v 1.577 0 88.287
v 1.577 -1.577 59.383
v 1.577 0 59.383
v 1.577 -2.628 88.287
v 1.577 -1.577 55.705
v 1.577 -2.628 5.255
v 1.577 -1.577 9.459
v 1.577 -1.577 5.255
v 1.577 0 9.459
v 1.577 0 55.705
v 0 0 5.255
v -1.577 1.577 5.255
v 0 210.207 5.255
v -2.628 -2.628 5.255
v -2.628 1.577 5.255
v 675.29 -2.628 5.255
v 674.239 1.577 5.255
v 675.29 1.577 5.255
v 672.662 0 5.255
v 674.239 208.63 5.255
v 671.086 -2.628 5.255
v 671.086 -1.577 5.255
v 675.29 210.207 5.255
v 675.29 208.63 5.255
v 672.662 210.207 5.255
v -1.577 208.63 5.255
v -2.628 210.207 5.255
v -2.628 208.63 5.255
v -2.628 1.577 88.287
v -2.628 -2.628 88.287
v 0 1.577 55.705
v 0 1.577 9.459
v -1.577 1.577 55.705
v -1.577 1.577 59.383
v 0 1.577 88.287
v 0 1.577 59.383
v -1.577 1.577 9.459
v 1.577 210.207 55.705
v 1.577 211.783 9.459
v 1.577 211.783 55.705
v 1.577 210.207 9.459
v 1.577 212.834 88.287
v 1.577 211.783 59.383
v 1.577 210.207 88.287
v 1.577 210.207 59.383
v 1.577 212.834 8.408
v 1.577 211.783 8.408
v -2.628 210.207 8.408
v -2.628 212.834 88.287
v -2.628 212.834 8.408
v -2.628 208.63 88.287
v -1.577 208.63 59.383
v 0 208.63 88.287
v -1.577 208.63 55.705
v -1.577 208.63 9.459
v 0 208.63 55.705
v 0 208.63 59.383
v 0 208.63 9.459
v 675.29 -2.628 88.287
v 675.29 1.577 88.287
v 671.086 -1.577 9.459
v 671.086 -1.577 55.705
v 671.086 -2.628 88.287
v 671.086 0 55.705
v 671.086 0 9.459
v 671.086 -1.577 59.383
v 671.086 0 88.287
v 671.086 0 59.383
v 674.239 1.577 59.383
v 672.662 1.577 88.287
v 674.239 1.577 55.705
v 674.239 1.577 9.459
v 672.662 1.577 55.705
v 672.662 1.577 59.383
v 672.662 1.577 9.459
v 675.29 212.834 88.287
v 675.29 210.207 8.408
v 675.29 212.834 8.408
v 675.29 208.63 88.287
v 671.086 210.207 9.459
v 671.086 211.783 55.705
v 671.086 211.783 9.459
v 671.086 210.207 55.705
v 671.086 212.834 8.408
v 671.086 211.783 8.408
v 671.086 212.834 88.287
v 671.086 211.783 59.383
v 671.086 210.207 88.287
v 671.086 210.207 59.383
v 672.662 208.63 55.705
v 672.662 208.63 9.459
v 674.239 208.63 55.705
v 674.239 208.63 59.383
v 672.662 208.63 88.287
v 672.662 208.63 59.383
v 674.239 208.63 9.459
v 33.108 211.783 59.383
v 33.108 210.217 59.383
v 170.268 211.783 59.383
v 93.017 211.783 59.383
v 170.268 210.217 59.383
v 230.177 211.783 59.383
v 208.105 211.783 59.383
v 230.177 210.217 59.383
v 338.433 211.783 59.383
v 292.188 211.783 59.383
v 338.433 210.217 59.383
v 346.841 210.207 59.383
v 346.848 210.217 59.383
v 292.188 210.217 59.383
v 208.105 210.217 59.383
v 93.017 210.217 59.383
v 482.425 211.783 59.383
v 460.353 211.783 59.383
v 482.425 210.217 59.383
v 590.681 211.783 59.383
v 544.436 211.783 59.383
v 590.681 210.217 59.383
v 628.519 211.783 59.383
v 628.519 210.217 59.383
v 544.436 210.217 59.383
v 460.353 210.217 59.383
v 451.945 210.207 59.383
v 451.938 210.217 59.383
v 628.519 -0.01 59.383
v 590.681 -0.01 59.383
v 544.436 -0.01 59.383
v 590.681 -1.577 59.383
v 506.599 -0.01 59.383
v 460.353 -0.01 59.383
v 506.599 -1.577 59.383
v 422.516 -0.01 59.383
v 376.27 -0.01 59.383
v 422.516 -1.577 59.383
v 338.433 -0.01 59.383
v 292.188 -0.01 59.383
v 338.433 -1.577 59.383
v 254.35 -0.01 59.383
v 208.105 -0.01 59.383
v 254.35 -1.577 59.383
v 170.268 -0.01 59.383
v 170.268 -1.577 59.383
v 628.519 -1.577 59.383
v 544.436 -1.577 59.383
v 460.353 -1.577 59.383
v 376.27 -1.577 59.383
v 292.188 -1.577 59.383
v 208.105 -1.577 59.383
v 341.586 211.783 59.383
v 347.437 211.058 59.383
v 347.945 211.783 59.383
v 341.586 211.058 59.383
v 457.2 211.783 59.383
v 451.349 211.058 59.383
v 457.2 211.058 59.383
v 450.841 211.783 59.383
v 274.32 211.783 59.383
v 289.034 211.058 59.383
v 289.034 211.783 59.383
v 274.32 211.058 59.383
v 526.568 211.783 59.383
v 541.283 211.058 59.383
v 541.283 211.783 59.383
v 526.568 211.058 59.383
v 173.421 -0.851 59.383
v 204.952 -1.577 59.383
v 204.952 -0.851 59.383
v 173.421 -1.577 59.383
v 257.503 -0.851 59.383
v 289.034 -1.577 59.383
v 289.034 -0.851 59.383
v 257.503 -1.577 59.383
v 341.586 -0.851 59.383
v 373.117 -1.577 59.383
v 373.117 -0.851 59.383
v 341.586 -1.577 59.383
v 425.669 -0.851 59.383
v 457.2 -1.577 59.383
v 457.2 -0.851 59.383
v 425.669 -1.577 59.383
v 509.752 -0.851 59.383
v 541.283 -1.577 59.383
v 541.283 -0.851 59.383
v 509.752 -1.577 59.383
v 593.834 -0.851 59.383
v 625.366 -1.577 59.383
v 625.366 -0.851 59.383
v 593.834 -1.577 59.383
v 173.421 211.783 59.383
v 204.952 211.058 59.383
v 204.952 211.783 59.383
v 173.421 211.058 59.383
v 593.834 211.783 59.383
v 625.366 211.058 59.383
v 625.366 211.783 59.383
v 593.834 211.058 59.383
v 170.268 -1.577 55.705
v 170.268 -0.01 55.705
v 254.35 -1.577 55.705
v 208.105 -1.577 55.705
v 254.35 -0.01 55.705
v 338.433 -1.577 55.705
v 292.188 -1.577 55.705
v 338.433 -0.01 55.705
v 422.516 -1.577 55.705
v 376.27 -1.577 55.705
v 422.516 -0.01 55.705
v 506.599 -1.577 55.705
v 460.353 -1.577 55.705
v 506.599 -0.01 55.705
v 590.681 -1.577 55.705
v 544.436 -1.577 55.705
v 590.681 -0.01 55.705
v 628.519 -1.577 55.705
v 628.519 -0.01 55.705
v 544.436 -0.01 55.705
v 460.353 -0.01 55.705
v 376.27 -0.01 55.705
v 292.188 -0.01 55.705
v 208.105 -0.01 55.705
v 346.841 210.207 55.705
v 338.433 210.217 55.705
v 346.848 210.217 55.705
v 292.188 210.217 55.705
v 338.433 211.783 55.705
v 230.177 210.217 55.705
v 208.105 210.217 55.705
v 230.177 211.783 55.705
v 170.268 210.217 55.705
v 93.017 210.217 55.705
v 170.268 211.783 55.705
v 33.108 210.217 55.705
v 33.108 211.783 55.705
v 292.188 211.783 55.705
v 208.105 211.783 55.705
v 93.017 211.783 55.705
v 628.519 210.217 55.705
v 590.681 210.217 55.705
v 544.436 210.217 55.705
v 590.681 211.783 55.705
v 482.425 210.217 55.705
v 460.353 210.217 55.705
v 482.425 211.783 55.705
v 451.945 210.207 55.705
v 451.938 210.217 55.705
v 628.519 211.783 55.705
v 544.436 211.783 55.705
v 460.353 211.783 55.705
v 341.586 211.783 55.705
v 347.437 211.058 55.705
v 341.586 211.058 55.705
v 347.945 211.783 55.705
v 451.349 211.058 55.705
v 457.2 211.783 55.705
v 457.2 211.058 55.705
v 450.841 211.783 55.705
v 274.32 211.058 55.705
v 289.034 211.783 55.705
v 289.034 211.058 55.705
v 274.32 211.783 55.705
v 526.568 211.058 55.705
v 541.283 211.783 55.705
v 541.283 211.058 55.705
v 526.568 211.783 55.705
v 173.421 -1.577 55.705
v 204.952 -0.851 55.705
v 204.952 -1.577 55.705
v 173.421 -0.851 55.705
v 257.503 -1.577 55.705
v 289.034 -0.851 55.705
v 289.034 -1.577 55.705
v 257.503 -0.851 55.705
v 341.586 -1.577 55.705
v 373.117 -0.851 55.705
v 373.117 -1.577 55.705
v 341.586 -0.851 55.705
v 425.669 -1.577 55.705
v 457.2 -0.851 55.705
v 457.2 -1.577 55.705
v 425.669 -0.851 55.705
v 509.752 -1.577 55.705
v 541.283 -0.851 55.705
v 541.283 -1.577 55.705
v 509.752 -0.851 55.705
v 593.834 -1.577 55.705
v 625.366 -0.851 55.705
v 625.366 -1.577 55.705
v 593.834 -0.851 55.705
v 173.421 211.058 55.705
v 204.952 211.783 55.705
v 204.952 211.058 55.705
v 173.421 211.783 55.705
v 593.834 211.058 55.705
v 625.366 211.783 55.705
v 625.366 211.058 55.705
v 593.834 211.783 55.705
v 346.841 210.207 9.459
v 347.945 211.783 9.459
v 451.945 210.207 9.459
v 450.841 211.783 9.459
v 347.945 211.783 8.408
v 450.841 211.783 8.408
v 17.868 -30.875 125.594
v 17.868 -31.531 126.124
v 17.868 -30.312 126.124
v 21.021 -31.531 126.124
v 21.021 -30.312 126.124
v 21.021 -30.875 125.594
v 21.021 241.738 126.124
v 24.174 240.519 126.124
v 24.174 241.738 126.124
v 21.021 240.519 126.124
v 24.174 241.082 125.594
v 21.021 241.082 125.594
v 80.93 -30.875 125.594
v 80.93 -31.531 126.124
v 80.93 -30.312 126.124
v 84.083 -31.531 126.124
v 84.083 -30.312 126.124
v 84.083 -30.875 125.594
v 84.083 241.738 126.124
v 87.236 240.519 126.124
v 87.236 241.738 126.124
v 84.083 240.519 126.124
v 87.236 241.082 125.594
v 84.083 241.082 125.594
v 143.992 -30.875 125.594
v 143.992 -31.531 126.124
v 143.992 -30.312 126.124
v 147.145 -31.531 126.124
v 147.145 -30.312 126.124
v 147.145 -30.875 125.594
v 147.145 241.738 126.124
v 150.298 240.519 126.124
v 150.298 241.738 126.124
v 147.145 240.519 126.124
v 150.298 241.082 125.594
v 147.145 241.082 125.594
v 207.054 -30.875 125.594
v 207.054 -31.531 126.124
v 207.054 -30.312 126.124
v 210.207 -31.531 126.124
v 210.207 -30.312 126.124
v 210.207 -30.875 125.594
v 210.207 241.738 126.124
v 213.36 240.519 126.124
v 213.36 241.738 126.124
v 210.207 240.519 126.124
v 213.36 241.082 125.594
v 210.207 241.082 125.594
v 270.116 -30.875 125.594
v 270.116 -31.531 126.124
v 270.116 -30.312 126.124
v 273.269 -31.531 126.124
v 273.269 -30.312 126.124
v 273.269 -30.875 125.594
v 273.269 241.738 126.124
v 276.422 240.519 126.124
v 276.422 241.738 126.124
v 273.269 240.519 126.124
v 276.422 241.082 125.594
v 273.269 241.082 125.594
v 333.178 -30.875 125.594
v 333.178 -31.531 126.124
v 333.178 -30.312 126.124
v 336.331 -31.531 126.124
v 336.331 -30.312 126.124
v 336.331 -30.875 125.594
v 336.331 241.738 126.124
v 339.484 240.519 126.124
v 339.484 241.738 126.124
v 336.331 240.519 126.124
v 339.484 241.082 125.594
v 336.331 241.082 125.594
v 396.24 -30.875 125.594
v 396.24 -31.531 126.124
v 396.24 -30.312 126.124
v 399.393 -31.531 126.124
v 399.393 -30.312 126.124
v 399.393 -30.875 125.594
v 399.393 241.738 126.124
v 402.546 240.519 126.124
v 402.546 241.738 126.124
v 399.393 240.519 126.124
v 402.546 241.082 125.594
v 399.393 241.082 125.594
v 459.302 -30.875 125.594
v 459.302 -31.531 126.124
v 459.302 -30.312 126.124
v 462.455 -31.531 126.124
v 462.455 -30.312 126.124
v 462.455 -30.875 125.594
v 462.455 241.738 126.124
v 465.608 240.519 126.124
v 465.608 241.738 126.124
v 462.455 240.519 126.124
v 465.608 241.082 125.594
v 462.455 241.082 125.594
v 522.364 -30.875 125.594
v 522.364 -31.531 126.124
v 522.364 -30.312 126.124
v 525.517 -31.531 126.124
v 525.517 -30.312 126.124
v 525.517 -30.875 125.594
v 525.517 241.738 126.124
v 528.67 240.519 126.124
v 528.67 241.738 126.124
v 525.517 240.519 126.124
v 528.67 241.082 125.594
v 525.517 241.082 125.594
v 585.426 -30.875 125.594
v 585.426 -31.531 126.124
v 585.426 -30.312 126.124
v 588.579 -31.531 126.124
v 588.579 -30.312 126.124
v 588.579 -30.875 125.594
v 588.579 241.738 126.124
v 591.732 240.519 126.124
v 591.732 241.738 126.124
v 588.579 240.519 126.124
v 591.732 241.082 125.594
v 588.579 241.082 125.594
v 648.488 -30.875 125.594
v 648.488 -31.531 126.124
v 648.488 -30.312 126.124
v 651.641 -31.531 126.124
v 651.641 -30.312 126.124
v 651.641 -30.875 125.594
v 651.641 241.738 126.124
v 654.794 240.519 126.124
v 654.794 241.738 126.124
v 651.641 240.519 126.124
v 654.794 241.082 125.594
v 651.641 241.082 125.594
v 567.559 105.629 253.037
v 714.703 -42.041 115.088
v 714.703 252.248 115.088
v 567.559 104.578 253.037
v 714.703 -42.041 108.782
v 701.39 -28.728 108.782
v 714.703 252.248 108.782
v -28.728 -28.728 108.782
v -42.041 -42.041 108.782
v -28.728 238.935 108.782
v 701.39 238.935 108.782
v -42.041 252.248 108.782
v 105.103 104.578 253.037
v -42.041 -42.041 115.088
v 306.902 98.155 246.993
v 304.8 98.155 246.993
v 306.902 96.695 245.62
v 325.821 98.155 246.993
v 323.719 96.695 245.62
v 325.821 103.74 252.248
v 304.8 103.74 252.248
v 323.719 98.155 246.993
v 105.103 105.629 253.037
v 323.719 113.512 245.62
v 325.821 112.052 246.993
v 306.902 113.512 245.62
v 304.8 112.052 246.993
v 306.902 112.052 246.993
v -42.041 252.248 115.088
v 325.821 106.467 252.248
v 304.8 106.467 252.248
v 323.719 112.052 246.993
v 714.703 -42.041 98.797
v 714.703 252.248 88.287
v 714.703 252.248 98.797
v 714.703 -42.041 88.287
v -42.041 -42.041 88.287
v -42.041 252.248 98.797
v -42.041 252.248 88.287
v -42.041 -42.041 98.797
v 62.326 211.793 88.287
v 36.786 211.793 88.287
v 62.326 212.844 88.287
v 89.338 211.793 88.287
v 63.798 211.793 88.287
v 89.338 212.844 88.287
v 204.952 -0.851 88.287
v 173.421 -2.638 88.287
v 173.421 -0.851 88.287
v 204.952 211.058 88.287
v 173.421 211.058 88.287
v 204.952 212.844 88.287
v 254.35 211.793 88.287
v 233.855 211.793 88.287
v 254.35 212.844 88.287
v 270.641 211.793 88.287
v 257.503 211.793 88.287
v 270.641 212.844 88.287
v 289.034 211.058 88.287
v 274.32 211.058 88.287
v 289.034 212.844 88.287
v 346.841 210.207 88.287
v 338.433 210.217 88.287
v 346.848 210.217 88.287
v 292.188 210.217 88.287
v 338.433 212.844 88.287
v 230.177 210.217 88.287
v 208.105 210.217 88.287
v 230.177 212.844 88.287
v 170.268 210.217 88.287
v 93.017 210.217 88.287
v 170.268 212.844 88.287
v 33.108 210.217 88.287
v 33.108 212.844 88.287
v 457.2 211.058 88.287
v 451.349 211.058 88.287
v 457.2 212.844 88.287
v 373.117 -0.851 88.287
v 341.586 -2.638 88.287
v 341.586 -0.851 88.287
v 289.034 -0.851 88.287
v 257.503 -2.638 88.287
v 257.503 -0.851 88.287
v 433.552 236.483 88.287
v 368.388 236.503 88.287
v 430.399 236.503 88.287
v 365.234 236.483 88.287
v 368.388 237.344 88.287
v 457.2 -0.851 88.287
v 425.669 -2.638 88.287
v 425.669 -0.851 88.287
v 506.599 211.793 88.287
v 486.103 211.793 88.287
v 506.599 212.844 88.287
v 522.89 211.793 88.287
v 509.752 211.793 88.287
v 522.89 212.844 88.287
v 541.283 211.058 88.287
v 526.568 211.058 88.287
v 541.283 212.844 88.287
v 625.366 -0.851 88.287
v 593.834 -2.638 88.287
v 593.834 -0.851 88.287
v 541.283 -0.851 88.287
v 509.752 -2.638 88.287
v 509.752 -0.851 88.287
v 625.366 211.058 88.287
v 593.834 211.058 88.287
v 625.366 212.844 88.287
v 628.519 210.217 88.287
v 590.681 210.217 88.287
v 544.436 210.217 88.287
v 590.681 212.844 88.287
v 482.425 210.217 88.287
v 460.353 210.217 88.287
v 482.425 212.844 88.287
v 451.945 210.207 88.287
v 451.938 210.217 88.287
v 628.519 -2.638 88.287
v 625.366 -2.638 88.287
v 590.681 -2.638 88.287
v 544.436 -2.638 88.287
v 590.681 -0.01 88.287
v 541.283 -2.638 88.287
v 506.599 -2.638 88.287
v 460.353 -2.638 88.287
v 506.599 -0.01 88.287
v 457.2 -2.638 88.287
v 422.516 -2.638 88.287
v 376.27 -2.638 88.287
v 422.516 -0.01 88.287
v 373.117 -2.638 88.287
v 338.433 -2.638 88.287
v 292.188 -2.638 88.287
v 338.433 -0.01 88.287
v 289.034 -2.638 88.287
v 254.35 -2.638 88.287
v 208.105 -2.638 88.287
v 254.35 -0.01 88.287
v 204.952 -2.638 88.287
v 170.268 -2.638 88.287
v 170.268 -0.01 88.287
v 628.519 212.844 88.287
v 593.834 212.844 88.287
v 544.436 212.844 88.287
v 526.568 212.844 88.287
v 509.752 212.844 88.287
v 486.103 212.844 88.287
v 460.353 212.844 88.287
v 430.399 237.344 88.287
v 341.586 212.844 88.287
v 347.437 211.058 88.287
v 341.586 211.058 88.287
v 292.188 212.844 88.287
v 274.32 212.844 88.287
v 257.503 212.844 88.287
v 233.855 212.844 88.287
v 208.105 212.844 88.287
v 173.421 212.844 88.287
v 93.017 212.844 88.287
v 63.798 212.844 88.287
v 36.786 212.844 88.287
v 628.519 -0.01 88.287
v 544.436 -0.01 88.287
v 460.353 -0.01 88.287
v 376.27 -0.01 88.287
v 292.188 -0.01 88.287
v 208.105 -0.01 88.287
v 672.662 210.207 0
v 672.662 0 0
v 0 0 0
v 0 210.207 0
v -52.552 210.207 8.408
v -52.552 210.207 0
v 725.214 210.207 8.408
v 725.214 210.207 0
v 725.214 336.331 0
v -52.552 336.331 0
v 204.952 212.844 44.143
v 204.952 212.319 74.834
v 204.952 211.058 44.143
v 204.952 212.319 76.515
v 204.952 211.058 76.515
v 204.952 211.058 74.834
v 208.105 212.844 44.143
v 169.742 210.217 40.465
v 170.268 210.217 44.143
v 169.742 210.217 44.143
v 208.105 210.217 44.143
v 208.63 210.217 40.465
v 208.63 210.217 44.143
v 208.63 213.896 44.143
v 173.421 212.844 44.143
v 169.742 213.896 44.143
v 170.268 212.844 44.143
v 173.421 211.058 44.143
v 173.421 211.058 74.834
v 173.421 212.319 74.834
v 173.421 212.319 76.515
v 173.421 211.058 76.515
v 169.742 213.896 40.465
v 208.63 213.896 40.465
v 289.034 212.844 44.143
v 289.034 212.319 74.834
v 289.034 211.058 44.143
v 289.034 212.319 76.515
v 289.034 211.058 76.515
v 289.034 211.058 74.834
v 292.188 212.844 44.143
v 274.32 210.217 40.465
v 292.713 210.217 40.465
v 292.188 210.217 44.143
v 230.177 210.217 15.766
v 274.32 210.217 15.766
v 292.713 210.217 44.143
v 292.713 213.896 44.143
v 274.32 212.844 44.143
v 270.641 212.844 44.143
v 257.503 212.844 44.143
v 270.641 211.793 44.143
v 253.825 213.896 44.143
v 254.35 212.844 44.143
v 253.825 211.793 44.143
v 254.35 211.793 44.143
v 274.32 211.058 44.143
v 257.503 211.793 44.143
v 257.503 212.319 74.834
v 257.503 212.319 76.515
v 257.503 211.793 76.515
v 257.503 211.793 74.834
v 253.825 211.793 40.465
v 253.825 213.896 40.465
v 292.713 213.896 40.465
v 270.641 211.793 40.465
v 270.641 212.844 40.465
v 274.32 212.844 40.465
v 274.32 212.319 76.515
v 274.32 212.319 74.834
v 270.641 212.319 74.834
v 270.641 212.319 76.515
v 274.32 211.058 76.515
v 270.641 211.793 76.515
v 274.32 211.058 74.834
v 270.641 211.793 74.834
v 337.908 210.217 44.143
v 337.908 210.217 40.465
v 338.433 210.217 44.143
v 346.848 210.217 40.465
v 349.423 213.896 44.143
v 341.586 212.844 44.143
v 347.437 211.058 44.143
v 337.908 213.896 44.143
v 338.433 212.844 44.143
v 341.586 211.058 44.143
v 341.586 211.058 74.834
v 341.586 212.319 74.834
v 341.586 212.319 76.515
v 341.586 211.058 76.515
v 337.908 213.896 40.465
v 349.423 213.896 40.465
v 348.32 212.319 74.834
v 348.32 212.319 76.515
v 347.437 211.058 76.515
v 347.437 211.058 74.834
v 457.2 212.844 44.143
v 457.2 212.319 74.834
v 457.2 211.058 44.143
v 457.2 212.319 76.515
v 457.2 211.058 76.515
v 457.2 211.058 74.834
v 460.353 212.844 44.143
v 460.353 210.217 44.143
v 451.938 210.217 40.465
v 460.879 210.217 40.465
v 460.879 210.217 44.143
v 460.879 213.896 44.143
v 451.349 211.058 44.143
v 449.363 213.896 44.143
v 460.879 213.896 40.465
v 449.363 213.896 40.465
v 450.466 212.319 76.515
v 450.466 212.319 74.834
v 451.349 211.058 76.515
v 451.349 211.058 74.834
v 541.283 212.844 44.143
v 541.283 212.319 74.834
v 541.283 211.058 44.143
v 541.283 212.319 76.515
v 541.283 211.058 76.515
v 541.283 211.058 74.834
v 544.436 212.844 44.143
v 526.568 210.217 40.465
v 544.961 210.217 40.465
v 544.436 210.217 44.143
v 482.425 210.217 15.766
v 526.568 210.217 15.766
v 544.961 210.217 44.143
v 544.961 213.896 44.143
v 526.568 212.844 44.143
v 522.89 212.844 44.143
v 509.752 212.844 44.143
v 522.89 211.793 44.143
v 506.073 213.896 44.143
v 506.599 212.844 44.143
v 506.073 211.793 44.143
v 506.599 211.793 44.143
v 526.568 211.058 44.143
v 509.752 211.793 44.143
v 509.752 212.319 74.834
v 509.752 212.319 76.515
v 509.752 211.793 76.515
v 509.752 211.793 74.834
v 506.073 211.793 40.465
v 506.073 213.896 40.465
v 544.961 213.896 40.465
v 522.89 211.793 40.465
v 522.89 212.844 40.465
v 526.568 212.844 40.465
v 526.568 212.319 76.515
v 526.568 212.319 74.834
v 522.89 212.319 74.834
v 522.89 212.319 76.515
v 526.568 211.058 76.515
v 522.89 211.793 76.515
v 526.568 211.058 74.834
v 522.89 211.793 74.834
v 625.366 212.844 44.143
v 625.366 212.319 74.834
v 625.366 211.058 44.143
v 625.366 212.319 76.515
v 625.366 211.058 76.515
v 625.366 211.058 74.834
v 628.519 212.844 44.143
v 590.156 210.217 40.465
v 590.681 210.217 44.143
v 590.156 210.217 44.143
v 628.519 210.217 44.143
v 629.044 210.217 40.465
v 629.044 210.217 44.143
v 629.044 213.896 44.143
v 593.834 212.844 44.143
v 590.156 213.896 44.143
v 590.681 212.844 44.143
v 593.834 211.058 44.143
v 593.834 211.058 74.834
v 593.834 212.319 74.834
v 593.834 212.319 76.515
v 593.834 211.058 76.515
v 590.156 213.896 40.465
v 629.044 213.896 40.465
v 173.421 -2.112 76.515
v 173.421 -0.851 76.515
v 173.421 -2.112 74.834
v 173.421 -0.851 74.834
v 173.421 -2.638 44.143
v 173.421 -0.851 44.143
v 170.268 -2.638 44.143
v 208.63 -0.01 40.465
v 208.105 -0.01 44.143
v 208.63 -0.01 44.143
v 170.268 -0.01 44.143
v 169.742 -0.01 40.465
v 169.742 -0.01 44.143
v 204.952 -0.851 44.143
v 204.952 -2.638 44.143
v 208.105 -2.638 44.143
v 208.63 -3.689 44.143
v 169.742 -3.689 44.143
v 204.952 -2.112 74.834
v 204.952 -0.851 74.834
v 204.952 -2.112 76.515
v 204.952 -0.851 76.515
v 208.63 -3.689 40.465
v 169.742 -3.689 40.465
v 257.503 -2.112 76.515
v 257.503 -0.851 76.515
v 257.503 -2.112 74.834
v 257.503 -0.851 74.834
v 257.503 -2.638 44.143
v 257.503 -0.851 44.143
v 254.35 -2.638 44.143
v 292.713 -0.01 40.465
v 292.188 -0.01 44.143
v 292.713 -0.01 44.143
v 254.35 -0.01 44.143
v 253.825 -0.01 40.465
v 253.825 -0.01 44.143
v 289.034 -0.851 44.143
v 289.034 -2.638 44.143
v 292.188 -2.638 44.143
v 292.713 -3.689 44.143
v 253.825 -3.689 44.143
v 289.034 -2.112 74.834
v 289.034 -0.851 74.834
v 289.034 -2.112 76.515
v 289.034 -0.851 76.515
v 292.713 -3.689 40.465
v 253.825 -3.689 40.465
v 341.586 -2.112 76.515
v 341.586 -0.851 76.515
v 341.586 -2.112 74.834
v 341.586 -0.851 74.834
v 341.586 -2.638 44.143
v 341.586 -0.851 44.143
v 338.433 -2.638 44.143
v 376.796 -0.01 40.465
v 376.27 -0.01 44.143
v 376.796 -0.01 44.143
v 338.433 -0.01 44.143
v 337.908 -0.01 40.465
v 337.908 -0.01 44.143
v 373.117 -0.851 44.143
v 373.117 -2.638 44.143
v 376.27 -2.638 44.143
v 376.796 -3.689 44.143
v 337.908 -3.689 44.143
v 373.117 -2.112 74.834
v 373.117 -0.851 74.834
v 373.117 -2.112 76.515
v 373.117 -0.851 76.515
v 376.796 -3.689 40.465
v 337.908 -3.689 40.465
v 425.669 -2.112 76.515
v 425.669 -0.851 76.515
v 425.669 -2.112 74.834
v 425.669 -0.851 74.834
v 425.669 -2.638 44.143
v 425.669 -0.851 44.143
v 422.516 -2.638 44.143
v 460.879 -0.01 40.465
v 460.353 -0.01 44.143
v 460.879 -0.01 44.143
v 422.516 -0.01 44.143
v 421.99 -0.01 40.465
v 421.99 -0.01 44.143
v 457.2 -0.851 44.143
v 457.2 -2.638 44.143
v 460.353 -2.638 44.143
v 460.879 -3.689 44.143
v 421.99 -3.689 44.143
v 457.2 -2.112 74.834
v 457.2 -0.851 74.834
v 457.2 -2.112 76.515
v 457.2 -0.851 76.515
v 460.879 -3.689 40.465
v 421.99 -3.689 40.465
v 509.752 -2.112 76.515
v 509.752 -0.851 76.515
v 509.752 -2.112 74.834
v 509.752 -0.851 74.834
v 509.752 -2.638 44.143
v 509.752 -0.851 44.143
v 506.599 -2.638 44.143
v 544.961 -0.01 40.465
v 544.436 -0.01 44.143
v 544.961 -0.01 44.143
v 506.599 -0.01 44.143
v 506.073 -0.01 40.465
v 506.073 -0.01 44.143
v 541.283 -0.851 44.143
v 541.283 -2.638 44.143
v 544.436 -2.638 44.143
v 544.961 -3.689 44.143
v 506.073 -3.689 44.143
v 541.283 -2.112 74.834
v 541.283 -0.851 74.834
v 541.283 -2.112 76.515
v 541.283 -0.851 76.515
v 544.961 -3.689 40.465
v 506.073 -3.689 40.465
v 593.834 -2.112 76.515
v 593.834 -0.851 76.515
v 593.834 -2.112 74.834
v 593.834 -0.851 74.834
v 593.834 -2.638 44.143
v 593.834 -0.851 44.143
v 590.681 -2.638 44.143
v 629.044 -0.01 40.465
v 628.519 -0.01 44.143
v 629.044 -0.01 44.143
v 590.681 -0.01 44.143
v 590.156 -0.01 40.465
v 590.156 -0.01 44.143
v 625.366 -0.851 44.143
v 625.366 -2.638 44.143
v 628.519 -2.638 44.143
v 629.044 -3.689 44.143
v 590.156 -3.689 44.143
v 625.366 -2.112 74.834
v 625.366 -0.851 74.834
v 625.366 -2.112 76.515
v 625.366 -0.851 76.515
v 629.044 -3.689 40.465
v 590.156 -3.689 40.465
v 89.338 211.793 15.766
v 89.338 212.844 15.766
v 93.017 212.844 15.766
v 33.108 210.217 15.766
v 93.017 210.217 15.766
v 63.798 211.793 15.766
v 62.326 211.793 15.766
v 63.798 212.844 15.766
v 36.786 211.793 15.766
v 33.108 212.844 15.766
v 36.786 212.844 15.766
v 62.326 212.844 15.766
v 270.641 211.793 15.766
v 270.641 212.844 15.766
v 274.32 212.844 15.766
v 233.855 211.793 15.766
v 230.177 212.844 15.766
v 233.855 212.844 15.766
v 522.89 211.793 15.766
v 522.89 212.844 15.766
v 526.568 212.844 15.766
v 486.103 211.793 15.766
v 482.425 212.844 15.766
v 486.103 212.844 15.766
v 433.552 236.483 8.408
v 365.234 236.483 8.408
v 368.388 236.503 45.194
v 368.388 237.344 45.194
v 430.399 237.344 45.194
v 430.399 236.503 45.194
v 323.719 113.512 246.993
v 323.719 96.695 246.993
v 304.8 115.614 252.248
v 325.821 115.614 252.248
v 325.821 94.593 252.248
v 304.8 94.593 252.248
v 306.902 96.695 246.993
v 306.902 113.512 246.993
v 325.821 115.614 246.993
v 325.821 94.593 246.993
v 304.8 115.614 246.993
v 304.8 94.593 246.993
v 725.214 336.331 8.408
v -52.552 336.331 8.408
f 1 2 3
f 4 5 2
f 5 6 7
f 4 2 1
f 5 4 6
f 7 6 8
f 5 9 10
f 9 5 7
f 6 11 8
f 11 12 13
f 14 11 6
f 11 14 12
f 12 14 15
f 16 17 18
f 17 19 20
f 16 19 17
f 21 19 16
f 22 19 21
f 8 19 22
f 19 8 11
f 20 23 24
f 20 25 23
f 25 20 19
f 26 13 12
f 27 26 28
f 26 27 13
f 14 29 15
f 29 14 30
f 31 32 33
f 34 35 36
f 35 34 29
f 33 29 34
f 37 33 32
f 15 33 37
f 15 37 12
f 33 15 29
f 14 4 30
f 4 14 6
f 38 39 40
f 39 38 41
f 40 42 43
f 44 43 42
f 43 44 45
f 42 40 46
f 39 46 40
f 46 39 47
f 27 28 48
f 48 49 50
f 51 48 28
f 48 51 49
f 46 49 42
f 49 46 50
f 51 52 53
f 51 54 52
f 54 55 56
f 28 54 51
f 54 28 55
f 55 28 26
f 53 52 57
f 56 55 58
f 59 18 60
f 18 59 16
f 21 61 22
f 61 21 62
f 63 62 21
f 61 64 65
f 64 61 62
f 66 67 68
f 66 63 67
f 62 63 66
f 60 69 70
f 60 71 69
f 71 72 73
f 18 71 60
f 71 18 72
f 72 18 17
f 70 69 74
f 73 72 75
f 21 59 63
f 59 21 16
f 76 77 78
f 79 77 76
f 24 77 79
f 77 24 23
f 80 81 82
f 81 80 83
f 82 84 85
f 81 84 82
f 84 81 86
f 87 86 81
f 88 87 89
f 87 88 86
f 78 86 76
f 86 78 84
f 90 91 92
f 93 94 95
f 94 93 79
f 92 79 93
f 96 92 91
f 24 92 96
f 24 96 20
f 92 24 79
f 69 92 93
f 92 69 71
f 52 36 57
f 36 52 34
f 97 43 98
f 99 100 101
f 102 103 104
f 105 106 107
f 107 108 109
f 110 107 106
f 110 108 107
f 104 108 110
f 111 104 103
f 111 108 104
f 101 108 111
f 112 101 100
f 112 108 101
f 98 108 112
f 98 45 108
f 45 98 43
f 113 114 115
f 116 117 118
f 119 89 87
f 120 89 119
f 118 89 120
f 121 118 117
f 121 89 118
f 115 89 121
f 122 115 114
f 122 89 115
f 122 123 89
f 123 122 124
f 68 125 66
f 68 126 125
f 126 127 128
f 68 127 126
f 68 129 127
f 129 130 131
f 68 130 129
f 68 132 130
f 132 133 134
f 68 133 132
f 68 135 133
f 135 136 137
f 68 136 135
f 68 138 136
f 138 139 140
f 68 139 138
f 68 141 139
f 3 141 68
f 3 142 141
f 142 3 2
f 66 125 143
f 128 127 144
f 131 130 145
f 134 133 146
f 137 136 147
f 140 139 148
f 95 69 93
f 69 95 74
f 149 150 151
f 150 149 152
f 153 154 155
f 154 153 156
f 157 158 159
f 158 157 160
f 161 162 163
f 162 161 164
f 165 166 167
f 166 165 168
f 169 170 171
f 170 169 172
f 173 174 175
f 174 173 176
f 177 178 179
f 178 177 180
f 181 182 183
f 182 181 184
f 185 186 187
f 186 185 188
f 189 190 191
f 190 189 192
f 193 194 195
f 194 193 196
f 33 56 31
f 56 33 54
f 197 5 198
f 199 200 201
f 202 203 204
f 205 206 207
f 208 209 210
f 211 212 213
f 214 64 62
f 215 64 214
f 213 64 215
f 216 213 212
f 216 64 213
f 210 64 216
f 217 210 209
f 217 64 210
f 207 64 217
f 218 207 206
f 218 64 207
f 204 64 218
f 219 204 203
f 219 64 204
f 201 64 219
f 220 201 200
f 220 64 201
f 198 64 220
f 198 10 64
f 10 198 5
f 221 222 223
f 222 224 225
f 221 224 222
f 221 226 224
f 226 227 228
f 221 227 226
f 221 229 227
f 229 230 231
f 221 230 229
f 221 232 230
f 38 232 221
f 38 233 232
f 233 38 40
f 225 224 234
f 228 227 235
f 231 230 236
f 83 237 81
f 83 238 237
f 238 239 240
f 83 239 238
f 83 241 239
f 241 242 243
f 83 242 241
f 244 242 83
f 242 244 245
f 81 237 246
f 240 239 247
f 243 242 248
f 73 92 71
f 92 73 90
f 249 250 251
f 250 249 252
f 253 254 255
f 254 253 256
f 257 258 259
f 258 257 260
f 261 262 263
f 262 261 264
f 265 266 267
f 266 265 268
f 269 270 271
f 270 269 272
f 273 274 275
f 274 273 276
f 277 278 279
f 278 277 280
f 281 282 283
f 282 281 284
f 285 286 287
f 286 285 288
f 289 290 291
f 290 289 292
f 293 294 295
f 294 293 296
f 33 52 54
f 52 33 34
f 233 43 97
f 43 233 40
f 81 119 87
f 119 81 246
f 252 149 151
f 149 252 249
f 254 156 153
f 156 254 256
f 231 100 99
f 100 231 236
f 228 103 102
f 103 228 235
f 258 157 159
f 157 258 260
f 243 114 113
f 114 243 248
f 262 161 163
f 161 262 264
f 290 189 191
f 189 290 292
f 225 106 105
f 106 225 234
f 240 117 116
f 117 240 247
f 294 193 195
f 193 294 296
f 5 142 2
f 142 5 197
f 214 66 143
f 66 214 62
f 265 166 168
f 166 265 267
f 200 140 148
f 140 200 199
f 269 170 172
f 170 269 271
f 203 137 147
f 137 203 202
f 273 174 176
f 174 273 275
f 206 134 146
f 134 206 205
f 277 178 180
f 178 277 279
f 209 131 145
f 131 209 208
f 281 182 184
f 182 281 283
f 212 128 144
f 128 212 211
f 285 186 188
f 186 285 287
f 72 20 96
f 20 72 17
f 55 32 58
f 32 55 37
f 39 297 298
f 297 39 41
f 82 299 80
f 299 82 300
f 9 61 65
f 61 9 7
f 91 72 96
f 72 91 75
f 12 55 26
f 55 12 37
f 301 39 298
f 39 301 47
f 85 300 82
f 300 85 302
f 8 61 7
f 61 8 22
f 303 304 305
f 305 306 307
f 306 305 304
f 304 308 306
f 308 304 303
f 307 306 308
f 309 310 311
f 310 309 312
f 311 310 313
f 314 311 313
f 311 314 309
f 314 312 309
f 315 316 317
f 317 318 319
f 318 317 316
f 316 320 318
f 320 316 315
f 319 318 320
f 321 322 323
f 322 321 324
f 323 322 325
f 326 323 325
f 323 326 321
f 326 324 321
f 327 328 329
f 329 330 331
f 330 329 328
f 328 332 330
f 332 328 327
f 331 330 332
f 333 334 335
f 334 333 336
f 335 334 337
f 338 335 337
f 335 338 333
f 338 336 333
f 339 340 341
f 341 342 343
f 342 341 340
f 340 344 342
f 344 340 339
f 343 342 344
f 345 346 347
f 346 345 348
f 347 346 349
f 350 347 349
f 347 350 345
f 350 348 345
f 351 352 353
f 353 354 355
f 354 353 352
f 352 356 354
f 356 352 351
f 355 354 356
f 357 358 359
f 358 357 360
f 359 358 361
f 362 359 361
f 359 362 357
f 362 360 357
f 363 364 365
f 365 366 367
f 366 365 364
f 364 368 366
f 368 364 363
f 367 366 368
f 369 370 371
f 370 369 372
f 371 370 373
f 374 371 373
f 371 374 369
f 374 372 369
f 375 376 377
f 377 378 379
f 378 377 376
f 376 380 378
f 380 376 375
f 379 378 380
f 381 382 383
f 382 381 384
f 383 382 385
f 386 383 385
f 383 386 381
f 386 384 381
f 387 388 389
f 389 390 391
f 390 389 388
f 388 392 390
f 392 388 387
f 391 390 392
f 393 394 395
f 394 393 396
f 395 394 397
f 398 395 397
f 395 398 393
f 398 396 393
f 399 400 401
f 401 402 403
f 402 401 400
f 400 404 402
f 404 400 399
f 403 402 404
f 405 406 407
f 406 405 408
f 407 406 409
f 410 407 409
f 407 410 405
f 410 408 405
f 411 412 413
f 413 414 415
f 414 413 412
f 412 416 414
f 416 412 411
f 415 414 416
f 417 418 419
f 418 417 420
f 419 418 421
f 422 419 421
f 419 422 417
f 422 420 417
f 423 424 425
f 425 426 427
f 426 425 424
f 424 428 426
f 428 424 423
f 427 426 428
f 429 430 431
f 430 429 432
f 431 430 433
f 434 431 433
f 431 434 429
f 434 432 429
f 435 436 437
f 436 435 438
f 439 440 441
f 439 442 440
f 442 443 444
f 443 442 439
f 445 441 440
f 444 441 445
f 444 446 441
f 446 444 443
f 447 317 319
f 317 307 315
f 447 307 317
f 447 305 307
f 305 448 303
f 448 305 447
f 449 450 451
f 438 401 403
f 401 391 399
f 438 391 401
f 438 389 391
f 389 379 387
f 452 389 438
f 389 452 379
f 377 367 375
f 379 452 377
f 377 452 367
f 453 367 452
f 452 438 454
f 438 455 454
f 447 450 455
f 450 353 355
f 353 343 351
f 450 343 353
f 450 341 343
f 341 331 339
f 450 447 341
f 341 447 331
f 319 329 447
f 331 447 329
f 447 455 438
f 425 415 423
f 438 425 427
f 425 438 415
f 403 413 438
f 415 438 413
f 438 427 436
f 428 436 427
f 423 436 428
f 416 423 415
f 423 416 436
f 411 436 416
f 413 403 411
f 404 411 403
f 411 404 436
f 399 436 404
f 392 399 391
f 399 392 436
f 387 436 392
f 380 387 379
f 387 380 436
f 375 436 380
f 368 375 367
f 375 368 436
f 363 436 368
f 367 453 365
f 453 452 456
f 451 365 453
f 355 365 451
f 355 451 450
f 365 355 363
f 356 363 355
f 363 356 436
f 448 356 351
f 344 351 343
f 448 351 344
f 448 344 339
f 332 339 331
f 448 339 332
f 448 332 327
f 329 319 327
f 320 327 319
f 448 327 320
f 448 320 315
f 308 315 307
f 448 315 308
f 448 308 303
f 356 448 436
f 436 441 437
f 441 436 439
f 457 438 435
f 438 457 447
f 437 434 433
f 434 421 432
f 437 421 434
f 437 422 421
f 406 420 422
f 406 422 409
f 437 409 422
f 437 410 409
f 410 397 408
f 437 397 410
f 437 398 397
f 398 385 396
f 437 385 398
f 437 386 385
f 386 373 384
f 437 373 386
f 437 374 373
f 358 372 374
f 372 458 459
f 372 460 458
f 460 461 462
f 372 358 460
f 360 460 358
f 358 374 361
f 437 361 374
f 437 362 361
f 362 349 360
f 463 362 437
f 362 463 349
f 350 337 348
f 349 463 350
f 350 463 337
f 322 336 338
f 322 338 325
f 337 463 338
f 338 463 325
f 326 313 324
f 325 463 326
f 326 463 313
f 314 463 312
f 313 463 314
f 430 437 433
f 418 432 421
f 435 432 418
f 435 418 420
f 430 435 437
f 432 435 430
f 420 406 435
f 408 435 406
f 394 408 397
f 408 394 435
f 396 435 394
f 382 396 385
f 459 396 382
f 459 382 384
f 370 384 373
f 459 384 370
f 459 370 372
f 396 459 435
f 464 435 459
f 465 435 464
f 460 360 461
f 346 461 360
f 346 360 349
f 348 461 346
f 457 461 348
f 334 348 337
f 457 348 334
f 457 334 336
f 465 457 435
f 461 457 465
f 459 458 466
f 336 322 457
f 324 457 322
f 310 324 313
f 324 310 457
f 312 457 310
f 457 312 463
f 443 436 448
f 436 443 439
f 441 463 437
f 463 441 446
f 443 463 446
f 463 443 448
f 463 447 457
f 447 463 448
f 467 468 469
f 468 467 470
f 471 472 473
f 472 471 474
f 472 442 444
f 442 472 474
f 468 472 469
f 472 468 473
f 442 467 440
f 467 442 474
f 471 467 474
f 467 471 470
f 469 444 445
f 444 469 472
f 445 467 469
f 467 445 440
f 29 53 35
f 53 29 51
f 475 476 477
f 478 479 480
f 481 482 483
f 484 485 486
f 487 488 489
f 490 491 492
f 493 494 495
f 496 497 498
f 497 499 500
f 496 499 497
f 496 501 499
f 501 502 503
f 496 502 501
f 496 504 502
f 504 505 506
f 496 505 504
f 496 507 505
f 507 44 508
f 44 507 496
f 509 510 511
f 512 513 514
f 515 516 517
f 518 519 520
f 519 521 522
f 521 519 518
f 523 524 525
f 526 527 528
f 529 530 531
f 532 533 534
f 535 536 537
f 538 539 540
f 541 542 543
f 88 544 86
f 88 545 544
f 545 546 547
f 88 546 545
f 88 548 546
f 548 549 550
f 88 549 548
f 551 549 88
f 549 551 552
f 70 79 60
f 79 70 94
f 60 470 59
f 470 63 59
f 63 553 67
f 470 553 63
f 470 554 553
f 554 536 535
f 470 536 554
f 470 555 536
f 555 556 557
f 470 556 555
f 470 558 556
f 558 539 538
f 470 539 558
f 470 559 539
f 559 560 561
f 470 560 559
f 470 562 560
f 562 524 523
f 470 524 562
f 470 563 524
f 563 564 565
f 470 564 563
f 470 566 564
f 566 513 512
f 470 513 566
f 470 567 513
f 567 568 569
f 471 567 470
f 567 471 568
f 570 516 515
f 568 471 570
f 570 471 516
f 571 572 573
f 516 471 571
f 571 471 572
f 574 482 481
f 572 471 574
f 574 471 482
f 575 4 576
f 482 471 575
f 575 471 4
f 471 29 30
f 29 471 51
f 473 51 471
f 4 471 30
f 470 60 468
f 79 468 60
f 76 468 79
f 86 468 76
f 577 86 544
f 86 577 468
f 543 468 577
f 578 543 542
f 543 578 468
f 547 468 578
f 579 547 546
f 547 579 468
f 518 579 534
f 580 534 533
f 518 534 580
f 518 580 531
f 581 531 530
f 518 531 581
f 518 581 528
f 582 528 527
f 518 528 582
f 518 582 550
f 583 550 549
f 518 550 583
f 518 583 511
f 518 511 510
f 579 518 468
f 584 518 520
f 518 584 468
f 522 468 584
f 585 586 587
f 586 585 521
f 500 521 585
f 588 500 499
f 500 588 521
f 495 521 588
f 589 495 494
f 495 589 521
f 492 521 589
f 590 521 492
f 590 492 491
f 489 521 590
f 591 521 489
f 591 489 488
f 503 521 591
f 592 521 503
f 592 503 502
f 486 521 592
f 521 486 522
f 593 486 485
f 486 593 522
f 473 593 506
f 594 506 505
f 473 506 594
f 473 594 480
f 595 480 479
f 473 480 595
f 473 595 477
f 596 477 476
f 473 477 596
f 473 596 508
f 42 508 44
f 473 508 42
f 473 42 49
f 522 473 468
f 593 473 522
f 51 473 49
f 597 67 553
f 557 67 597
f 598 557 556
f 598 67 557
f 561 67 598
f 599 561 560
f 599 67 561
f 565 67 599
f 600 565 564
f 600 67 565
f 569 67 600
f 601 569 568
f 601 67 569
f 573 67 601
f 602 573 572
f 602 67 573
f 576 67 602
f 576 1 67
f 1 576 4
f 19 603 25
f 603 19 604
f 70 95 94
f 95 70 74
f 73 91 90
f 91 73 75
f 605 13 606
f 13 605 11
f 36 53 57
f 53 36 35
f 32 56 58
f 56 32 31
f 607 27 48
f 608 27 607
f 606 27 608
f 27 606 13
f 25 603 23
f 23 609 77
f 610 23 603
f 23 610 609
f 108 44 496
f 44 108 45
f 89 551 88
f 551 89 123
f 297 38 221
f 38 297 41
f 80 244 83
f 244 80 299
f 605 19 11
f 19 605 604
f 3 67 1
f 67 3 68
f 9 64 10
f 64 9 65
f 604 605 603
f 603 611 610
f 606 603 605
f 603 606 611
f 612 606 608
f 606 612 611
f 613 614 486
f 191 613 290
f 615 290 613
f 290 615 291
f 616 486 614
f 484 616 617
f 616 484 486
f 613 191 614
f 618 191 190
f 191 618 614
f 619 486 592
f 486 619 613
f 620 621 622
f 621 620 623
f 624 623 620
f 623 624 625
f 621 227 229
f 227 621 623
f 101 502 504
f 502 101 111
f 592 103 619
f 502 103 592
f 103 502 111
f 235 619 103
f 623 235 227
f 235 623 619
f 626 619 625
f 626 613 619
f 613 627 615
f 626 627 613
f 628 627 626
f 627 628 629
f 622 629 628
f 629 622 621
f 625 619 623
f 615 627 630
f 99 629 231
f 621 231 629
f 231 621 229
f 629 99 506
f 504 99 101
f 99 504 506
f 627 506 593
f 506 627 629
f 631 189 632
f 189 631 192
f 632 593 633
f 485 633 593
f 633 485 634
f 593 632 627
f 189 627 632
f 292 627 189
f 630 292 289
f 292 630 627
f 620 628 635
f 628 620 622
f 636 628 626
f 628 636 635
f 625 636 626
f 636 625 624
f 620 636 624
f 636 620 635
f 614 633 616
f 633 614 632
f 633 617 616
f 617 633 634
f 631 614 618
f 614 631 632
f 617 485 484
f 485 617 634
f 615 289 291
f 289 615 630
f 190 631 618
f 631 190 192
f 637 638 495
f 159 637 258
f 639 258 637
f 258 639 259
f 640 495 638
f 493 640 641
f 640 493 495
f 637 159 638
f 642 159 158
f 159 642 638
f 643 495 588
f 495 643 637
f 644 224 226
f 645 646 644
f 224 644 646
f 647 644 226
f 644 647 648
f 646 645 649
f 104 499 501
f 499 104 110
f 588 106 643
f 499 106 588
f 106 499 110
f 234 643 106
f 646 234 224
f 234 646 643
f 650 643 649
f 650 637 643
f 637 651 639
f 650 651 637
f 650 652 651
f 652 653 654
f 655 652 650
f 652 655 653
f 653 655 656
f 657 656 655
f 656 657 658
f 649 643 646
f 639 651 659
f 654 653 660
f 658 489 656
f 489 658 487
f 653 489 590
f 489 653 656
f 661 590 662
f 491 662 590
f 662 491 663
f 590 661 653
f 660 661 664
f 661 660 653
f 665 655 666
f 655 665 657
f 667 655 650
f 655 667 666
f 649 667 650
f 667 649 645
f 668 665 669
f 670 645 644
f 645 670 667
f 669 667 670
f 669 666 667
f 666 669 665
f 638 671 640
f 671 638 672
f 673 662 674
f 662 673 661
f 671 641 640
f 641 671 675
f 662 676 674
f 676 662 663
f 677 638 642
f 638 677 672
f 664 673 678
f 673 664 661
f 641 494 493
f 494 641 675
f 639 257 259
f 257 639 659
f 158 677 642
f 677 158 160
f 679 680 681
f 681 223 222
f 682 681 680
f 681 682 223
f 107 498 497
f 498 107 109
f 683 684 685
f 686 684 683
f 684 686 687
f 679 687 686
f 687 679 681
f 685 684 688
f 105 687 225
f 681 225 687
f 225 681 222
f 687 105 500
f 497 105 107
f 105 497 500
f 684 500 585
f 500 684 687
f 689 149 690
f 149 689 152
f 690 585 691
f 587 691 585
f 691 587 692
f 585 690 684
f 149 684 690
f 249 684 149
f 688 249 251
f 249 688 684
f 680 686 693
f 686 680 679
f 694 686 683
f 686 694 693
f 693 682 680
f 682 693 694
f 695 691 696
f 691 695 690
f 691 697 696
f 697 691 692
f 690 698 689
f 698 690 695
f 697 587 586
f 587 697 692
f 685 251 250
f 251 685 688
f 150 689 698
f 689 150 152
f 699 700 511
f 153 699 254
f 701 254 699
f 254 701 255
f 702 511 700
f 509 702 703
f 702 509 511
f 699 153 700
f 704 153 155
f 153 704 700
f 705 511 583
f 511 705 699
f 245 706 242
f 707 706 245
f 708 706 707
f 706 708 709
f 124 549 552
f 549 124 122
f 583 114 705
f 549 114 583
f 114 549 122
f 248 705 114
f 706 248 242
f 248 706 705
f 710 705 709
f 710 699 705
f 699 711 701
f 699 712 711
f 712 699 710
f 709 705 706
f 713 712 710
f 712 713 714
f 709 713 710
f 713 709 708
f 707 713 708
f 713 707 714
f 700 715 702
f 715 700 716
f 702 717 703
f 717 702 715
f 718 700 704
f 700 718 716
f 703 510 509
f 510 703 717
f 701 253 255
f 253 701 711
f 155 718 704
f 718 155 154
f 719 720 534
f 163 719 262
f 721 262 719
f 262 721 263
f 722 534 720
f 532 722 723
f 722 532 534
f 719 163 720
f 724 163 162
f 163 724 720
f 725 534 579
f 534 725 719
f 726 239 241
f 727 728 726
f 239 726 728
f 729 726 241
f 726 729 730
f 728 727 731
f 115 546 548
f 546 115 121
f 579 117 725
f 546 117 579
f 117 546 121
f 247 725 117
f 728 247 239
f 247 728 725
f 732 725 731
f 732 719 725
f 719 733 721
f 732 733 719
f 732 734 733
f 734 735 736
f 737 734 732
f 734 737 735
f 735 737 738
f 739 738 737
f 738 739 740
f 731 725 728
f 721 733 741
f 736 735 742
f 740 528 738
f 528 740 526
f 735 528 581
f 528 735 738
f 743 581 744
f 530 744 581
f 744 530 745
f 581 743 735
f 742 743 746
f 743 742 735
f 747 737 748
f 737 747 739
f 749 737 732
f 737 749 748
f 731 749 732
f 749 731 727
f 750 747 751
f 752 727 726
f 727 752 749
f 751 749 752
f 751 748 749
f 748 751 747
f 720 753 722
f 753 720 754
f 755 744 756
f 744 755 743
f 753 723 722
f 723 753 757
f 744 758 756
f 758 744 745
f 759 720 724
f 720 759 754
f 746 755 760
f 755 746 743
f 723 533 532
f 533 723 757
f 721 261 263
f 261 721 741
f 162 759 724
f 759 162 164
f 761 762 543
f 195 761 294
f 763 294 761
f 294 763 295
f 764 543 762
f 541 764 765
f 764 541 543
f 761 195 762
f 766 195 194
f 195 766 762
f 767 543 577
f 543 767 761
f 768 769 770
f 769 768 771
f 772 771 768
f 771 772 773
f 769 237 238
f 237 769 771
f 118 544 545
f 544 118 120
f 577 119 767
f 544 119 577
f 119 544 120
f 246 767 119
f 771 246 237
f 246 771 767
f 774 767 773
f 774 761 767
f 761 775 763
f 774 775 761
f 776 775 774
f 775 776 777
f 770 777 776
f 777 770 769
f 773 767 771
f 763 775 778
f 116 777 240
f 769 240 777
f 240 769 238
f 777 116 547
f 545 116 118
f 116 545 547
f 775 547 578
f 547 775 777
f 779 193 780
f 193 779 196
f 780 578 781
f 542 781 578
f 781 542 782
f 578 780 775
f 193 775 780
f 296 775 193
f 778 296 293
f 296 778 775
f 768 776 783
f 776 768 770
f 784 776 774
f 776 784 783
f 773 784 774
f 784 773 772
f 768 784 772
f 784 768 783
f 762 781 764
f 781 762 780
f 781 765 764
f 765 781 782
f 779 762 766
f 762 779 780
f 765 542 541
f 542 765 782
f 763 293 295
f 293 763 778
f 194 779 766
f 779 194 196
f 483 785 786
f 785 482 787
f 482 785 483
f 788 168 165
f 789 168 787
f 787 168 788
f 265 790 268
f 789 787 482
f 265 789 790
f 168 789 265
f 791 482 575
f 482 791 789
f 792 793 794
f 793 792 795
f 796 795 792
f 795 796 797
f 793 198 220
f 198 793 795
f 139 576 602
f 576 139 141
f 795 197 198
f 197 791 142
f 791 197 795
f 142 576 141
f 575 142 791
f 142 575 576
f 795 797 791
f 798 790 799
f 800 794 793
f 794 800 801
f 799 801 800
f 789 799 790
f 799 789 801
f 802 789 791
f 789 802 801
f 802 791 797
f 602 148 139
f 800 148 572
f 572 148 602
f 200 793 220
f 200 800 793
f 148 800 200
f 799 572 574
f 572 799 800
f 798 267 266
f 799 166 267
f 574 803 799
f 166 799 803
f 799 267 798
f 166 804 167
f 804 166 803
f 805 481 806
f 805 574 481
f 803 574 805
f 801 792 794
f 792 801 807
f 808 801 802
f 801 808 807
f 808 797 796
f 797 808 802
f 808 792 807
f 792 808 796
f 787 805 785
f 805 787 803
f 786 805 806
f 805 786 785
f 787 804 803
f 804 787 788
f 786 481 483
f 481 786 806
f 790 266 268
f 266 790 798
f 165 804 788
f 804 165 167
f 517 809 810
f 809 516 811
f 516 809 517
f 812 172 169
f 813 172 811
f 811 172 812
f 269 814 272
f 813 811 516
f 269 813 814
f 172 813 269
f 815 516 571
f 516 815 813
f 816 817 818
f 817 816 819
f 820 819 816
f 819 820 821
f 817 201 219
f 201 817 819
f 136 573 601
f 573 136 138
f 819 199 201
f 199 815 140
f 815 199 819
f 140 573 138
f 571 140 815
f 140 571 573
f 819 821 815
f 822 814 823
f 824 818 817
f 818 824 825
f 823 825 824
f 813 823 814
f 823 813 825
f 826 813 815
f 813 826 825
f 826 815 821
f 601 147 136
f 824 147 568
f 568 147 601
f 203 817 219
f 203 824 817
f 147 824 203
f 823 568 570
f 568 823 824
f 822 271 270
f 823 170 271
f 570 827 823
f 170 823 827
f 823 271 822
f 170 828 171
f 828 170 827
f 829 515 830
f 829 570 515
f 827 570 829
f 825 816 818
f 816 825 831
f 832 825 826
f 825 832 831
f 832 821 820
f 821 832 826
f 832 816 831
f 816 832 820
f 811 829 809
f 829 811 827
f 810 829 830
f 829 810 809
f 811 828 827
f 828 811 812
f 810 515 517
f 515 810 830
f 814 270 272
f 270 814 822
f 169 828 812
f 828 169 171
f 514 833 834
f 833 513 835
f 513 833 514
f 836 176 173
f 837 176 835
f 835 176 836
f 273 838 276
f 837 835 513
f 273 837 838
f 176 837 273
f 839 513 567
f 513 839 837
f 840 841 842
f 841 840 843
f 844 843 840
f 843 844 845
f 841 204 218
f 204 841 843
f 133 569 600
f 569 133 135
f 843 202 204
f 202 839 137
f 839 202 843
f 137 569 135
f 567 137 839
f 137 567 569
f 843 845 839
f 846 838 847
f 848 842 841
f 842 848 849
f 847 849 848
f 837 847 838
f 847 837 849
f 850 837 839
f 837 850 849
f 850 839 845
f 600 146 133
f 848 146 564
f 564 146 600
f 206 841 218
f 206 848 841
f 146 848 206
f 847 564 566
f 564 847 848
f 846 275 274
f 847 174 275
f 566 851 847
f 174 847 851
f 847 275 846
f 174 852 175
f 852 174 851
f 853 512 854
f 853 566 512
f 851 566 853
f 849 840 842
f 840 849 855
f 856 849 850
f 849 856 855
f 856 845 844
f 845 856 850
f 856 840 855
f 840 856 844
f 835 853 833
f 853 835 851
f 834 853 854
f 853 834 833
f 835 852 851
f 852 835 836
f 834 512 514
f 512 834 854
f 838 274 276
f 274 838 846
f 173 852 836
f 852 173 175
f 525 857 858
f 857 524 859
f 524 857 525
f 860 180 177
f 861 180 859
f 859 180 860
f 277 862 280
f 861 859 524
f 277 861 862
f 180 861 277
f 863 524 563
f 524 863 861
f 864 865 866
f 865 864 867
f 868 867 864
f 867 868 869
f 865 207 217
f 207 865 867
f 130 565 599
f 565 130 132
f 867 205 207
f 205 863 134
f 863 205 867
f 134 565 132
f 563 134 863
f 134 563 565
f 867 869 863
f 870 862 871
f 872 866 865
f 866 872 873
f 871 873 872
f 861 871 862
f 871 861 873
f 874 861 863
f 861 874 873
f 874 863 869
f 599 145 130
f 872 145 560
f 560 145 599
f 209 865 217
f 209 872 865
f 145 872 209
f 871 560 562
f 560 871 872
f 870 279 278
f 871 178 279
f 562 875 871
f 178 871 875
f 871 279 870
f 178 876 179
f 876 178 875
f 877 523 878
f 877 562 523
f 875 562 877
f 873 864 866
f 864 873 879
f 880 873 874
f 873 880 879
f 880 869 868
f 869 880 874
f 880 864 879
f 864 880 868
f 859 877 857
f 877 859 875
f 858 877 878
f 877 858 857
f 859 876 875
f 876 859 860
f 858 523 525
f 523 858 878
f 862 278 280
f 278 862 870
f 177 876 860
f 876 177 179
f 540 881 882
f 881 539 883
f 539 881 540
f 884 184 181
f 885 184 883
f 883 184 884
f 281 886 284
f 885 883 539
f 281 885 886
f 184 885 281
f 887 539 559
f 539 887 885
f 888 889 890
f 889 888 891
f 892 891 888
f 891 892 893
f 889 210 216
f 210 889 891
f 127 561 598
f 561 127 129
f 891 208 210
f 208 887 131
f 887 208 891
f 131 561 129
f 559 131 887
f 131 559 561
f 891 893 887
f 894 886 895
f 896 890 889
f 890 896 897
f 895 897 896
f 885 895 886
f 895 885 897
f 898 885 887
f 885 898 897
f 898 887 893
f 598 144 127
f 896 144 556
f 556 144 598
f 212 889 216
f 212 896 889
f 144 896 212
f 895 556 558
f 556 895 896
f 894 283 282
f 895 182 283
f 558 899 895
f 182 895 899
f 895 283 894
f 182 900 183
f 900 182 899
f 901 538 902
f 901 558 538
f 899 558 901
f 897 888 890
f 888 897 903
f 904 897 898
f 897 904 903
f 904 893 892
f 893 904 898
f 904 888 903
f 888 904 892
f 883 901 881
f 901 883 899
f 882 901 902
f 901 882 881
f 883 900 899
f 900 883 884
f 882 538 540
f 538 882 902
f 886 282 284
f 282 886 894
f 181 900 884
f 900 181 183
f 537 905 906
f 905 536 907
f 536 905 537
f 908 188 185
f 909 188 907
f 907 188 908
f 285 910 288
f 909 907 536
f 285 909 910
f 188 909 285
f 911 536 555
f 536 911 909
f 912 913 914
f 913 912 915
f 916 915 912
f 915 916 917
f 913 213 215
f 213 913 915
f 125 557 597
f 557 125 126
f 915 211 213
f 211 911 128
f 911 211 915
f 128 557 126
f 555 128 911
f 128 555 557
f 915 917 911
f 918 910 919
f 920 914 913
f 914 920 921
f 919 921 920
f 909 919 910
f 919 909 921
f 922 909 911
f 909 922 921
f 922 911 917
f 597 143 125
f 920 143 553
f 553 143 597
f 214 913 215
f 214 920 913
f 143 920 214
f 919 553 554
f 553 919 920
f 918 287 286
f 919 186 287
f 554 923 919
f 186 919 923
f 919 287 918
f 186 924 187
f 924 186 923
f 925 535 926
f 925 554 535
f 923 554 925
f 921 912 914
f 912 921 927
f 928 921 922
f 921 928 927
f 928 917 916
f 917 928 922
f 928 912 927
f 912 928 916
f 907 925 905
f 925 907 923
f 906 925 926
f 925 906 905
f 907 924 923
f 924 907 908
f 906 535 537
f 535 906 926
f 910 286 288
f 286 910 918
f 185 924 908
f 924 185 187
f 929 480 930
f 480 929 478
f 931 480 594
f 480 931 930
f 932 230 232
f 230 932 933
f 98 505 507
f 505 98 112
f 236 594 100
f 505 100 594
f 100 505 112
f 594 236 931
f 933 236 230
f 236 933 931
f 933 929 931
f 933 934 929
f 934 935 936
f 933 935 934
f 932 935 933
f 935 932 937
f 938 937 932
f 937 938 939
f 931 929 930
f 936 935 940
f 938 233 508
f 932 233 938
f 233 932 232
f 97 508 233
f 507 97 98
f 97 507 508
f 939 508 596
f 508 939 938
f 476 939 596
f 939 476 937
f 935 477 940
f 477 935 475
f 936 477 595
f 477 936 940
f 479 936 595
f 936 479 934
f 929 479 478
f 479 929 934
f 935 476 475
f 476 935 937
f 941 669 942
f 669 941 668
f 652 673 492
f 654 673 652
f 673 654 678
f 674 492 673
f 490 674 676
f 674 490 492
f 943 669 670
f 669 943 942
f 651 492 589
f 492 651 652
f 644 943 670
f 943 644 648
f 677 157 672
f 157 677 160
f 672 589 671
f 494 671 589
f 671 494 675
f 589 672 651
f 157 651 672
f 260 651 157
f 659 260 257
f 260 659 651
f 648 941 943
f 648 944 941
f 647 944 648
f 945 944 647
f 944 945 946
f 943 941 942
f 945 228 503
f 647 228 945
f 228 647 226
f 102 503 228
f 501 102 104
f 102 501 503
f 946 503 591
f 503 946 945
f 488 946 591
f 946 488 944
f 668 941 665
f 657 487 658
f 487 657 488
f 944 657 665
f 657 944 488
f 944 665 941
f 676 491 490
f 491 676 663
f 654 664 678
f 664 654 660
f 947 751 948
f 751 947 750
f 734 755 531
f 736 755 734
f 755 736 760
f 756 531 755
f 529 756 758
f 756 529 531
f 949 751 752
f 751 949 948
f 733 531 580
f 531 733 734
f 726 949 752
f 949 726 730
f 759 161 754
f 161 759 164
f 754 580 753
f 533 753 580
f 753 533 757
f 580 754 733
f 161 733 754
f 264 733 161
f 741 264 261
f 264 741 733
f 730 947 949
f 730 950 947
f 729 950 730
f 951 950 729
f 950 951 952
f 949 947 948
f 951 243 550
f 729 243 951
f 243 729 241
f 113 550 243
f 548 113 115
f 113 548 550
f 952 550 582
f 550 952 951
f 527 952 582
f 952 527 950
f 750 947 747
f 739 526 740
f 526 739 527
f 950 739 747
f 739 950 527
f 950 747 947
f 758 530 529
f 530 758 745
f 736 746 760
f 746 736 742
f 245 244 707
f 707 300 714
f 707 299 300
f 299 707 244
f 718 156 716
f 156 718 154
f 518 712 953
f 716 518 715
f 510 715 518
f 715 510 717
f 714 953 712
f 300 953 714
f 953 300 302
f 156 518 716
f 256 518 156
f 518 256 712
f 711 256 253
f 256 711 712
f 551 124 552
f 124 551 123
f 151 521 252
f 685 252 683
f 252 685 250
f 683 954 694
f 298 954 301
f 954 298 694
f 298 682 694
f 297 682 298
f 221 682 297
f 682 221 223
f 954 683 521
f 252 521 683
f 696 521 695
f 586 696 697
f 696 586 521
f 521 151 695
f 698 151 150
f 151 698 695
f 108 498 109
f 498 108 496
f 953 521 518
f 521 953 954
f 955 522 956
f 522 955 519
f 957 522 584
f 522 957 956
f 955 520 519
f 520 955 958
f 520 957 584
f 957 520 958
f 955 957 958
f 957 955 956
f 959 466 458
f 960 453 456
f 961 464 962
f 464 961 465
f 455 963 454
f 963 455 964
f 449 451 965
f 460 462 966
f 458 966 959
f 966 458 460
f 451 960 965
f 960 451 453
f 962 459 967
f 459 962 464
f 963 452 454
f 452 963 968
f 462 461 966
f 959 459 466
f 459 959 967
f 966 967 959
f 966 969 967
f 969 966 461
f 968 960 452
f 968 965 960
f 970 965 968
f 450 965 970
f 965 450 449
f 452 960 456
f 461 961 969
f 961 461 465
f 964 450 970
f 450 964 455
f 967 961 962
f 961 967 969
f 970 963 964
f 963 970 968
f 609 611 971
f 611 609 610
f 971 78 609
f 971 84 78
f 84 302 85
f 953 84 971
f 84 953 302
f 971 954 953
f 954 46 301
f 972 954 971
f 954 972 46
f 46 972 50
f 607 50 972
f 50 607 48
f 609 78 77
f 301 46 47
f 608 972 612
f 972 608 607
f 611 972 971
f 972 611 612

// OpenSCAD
// =====================================================================
//  MILWAUKEE ROAD - RICHLAND CENTER, WIS. PASSENGER DEPOT
//  Source: Album sheet 67, drawing B-616, Nov 3 1909.  Drawings are private reference (in copyright):
//  Research Library / RSW / Stations / Standard depots / Album of Depot Plans 1919.
//  Rib Side Works, 24 Nov 2026. FIRST SHAPE MODEL for review - not cut into print sections.
//  KNOWN (from the sheet): 64 x 20 ft; baggage 12 ft 6 x 19, smoking 16 x 19, ticket office 11 ft 10 x 9 with bay, women's waiting 16 x 19; hipped shingle roof with flared eaves, diamond-pane upper sash.
//  ESTIMATE: wall and ridge heights where not written, window count and spacing, colours.
//  Built with the shared depot builder ../../../_common/rsw_depot.scad (x along the track,
//  y = 0 town side, track side +y, feet).  SCALE: 29 = G, 48 = O, 87 = HO.
// =====================================================================
SCALE = 29;
include <../../../_common/rsw_depot.scad>

depot(blocks = [[0, 64, 0, 20, 12, 0.75, 3, 4, 0]],
      pavs   = [],
      wins   = [[18.0, 1, 3, 6, 4.2], [26.0, 1, 3, 6, 4.2], [34.0, 1, 3, 6, 4.2], [42.0, 1, 3, 6, 4.2], [50.0, 1, 3, 6, 4.2], [58.0, 1, 3, 6, 4.2], [18.0, 0, 3, 6, 4.2], [26.0, 0, 3, 6, 4.2], [34.0, 0, 3, 6, 4.2], [42.0, 0, 3, 6, 4.2], [50.0, 0, 3, 6, 4.2], [58.0, 0, 3, 6, 4.2]],
      doors  = [[6, 1, 5, 8, 1], [24, 1, 3.5, 7.5, 0], [48, 1, 3.5, 7.5, 0]],
      bays   = [[38, 1, 10, 2.5]],
      chims  = [[30, 10, 24]],
      plat   = [-5, 74, 12, 0.8]);
